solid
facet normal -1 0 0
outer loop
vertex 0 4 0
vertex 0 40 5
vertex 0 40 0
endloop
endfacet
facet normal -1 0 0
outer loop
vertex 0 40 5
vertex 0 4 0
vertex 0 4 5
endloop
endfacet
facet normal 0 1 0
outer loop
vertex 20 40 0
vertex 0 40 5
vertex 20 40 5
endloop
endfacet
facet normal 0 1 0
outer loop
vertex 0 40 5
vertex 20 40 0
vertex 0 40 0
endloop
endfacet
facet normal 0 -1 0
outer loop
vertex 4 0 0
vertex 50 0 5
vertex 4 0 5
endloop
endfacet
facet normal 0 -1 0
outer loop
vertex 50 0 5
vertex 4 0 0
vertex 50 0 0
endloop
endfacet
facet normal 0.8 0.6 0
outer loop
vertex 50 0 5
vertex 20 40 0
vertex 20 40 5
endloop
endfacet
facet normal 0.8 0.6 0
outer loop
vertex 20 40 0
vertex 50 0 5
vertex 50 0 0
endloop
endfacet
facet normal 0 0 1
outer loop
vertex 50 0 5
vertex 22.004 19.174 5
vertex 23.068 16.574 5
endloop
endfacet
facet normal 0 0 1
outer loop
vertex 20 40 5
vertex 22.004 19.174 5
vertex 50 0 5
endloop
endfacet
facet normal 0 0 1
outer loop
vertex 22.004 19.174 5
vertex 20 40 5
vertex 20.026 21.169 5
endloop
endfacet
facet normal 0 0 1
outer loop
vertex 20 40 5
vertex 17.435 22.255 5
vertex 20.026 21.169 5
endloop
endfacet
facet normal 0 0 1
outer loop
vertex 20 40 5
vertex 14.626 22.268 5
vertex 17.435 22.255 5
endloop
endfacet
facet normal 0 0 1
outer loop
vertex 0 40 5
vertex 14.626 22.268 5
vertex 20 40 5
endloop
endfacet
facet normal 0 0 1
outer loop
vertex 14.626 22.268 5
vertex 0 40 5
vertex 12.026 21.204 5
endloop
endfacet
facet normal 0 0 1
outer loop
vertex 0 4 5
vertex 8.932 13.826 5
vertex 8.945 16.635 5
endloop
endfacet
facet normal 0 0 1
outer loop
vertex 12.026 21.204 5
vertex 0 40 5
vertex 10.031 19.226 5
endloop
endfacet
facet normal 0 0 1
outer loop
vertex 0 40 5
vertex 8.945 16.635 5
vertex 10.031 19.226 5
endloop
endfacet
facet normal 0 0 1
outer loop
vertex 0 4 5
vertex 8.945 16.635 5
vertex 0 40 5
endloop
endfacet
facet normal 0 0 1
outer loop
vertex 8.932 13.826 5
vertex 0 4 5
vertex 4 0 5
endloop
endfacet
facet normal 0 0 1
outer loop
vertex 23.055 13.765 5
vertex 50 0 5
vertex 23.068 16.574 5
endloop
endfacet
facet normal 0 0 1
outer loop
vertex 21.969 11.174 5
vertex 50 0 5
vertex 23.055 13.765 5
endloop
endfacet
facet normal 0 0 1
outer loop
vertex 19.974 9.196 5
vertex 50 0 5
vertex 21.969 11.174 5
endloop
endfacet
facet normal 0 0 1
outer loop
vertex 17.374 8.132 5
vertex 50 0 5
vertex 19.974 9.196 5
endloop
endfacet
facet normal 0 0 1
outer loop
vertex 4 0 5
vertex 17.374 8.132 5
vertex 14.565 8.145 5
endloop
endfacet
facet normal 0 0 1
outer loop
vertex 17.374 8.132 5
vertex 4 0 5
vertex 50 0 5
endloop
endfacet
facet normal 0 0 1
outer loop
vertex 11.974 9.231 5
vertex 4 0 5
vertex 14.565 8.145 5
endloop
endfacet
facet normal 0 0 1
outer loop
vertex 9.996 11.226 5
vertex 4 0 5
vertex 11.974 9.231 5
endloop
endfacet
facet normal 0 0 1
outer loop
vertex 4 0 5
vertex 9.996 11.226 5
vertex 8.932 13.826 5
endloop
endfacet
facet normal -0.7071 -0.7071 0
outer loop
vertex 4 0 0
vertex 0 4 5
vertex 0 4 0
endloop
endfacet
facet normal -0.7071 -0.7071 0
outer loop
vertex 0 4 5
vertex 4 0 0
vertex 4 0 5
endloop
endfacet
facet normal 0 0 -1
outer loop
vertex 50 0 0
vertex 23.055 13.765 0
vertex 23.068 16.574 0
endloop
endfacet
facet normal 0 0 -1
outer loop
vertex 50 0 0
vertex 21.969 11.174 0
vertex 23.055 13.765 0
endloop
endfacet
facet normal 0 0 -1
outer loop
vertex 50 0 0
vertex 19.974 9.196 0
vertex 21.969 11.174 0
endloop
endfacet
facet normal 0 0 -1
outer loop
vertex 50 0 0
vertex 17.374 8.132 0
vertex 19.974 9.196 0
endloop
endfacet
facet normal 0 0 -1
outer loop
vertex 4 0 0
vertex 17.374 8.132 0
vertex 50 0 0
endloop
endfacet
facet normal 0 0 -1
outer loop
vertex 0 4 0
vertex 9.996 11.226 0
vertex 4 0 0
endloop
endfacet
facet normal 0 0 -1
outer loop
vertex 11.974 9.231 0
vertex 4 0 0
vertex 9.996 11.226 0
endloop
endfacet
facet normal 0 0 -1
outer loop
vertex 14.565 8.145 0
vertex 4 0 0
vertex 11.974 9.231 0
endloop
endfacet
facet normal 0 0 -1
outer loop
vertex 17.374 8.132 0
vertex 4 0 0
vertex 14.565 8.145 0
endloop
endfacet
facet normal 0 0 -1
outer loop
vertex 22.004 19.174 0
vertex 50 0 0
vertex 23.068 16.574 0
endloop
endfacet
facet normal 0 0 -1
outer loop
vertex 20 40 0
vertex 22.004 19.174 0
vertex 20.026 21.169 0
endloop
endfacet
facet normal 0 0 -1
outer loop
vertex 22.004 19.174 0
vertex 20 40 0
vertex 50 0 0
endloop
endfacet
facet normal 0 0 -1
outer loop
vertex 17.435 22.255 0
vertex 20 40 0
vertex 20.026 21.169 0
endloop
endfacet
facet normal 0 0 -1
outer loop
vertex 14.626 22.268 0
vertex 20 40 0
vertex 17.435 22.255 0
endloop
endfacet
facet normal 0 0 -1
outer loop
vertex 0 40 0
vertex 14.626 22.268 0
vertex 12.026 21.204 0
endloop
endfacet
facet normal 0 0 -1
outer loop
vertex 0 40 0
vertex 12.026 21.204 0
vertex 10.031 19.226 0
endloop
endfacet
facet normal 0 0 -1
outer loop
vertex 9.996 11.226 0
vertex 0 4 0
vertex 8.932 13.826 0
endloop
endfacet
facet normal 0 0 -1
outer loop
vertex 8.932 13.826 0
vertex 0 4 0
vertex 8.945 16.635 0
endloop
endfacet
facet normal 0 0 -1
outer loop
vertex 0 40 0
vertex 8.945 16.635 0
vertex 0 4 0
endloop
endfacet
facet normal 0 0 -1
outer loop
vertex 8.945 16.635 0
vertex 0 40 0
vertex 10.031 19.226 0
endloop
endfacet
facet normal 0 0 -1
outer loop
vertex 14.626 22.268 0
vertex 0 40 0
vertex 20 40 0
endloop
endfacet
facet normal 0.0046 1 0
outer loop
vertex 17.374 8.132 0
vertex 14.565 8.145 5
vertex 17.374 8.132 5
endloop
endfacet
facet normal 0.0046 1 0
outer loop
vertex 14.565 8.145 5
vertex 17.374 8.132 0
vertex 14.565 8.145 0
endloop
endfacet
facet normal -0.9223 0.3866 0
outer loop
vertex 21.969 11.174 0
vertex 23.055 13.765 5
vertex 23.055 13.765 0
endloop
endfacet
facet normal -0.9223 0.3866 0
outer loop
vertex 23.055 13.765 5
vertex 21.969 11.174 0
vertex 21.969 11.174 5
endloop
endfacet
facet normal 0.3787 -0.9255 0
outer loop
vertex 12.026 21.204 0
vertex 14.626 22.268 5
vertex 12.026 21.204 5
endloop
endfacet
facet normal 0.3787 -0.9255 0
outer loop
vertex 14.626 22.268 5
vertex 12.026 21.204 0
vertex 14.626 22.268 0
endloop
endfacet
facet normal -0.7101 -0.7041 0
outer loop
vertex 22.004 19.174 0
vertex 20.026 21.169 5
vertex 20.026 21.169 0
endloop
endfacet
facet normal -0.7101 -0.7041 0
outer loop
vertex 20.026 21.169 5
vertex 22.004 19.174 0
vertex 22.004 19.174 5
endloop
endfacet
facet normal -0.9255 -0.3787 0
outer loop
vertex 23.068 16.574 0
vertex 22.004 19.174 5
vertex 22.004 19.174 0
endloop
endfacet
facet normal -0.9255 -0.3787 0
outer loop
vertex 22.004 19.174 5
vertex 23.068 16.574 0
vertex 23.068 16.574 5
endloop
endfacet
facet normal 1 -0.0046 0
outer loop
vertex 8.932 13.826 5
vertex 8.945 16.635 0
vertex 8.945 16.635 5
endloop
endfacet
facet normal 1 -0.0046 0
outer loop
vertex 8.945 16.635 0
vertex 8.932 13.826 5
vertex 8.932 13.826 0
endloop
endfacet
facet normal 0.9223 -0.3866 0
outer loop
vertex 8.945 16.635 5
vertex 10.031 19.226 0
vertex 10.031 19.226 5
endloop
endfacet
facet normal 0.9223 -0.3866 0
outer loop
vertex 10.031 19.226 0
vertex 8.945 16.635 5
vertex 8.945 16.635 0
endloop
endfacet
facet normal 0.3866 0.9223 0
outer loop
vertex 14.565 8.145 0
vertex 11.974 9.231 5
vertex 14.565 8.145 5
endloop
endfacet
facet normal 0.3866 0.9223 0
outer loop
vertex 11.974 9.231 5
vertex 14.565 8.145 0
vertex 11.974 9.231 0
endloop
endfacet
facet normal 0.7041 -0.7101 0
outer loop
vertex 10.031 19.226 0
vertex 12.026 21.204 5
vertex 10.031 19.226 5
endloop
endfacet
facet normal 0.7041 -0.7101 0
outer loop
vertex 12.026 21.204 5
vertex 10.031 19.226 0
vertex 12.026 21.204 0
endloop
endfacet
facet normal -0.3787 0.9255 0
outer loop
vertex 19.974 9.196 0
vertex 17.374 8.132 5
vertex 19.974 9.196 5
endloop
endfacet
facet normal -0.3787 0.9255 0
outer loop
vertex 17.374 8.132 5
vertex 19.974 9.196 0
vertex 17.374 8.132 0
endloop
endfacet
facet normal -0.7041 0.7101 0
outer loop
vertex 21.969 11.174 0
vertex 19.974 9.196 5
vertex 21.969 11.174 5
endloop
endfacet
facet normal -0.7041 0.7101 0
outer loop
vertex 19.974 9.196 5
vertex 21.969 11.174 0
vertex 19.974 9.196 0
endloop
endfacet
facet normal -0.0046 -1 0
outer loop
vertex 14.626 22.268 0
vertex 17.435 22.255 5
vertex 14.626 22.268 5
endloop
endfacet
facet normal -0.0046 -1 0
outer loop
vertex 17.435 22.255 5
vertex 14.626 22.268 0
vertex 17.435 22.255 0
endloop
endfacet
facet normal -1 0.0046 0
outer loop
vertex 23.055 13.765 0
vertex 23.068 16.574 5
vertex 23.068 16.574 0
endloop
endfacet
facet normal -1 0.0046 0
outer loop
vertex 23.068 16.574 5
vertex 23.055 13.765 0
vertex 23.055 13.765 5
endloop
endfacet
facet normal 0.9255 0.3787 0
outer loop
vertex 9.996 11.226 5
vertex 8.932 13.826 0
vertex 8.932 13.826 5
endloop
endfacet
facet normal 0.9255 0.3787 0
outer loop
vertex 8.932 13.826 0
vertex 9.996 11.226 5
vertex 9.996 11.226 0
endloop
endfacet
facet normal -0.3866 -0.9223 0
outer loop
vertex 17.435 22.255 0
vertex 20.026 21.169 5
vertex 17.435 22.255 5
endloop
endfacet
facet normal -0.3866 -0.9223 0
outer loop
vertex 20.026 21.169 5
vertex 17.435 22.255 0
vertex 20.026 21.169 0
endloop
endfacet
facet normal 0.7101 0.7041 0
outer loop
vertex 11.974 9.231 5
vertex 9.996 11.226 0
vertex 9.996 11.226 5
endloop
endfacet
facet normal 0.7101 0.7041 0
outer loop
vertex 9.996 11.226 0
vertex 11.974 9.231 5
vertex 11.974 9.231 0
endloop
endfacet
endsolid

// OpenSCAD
$fn = 32;

// ----------------------------------------------------------------------
// Bracket plate: gusset 50 x 40
// ----------------------------------------------------------------------

// --- parameters (mm) ---
hole_r = 4;               // bolt hole radius
plate_t = 5;              // plate thickness, Z (extrusion height)
gus_a = 50;               // base length
gus_b = 40;               // height
top_x = 20;               // top edge X of the angled cut
light_r = 7.2;            // lightening hole radius

light_d = 2 * light_r;

profile = [[4, 0], [25, 0], [50, 0], [20, 40], [0, 40], [0, 4]];  // primary outline, 6 points, counter clockwise
void_1 = [[23.068, 16.574], [22.004, 19.174], [20.026, 21.169], [17.435, 22.255], [14.626, 22.268], [12.026, 21.204], [10.031, 19.226], [8.945, 16.635], [8.932, 13.826], [9.996, 11.226], [11.974, 9.231], [14.565, 8.145], [17.374, 8.132], [19.974, 9.196], [21.969, 11.174], [23.055, 13.765]];  // lightening hole, 16 points

// --- the one profile operation ---
difference() {
  linear_extrude(height = plate_t) polygon(points = profile);
  translate([0, 0, -1])
    linear_extrude(height = plate_t + 2) polygon(points = void_1);
}
